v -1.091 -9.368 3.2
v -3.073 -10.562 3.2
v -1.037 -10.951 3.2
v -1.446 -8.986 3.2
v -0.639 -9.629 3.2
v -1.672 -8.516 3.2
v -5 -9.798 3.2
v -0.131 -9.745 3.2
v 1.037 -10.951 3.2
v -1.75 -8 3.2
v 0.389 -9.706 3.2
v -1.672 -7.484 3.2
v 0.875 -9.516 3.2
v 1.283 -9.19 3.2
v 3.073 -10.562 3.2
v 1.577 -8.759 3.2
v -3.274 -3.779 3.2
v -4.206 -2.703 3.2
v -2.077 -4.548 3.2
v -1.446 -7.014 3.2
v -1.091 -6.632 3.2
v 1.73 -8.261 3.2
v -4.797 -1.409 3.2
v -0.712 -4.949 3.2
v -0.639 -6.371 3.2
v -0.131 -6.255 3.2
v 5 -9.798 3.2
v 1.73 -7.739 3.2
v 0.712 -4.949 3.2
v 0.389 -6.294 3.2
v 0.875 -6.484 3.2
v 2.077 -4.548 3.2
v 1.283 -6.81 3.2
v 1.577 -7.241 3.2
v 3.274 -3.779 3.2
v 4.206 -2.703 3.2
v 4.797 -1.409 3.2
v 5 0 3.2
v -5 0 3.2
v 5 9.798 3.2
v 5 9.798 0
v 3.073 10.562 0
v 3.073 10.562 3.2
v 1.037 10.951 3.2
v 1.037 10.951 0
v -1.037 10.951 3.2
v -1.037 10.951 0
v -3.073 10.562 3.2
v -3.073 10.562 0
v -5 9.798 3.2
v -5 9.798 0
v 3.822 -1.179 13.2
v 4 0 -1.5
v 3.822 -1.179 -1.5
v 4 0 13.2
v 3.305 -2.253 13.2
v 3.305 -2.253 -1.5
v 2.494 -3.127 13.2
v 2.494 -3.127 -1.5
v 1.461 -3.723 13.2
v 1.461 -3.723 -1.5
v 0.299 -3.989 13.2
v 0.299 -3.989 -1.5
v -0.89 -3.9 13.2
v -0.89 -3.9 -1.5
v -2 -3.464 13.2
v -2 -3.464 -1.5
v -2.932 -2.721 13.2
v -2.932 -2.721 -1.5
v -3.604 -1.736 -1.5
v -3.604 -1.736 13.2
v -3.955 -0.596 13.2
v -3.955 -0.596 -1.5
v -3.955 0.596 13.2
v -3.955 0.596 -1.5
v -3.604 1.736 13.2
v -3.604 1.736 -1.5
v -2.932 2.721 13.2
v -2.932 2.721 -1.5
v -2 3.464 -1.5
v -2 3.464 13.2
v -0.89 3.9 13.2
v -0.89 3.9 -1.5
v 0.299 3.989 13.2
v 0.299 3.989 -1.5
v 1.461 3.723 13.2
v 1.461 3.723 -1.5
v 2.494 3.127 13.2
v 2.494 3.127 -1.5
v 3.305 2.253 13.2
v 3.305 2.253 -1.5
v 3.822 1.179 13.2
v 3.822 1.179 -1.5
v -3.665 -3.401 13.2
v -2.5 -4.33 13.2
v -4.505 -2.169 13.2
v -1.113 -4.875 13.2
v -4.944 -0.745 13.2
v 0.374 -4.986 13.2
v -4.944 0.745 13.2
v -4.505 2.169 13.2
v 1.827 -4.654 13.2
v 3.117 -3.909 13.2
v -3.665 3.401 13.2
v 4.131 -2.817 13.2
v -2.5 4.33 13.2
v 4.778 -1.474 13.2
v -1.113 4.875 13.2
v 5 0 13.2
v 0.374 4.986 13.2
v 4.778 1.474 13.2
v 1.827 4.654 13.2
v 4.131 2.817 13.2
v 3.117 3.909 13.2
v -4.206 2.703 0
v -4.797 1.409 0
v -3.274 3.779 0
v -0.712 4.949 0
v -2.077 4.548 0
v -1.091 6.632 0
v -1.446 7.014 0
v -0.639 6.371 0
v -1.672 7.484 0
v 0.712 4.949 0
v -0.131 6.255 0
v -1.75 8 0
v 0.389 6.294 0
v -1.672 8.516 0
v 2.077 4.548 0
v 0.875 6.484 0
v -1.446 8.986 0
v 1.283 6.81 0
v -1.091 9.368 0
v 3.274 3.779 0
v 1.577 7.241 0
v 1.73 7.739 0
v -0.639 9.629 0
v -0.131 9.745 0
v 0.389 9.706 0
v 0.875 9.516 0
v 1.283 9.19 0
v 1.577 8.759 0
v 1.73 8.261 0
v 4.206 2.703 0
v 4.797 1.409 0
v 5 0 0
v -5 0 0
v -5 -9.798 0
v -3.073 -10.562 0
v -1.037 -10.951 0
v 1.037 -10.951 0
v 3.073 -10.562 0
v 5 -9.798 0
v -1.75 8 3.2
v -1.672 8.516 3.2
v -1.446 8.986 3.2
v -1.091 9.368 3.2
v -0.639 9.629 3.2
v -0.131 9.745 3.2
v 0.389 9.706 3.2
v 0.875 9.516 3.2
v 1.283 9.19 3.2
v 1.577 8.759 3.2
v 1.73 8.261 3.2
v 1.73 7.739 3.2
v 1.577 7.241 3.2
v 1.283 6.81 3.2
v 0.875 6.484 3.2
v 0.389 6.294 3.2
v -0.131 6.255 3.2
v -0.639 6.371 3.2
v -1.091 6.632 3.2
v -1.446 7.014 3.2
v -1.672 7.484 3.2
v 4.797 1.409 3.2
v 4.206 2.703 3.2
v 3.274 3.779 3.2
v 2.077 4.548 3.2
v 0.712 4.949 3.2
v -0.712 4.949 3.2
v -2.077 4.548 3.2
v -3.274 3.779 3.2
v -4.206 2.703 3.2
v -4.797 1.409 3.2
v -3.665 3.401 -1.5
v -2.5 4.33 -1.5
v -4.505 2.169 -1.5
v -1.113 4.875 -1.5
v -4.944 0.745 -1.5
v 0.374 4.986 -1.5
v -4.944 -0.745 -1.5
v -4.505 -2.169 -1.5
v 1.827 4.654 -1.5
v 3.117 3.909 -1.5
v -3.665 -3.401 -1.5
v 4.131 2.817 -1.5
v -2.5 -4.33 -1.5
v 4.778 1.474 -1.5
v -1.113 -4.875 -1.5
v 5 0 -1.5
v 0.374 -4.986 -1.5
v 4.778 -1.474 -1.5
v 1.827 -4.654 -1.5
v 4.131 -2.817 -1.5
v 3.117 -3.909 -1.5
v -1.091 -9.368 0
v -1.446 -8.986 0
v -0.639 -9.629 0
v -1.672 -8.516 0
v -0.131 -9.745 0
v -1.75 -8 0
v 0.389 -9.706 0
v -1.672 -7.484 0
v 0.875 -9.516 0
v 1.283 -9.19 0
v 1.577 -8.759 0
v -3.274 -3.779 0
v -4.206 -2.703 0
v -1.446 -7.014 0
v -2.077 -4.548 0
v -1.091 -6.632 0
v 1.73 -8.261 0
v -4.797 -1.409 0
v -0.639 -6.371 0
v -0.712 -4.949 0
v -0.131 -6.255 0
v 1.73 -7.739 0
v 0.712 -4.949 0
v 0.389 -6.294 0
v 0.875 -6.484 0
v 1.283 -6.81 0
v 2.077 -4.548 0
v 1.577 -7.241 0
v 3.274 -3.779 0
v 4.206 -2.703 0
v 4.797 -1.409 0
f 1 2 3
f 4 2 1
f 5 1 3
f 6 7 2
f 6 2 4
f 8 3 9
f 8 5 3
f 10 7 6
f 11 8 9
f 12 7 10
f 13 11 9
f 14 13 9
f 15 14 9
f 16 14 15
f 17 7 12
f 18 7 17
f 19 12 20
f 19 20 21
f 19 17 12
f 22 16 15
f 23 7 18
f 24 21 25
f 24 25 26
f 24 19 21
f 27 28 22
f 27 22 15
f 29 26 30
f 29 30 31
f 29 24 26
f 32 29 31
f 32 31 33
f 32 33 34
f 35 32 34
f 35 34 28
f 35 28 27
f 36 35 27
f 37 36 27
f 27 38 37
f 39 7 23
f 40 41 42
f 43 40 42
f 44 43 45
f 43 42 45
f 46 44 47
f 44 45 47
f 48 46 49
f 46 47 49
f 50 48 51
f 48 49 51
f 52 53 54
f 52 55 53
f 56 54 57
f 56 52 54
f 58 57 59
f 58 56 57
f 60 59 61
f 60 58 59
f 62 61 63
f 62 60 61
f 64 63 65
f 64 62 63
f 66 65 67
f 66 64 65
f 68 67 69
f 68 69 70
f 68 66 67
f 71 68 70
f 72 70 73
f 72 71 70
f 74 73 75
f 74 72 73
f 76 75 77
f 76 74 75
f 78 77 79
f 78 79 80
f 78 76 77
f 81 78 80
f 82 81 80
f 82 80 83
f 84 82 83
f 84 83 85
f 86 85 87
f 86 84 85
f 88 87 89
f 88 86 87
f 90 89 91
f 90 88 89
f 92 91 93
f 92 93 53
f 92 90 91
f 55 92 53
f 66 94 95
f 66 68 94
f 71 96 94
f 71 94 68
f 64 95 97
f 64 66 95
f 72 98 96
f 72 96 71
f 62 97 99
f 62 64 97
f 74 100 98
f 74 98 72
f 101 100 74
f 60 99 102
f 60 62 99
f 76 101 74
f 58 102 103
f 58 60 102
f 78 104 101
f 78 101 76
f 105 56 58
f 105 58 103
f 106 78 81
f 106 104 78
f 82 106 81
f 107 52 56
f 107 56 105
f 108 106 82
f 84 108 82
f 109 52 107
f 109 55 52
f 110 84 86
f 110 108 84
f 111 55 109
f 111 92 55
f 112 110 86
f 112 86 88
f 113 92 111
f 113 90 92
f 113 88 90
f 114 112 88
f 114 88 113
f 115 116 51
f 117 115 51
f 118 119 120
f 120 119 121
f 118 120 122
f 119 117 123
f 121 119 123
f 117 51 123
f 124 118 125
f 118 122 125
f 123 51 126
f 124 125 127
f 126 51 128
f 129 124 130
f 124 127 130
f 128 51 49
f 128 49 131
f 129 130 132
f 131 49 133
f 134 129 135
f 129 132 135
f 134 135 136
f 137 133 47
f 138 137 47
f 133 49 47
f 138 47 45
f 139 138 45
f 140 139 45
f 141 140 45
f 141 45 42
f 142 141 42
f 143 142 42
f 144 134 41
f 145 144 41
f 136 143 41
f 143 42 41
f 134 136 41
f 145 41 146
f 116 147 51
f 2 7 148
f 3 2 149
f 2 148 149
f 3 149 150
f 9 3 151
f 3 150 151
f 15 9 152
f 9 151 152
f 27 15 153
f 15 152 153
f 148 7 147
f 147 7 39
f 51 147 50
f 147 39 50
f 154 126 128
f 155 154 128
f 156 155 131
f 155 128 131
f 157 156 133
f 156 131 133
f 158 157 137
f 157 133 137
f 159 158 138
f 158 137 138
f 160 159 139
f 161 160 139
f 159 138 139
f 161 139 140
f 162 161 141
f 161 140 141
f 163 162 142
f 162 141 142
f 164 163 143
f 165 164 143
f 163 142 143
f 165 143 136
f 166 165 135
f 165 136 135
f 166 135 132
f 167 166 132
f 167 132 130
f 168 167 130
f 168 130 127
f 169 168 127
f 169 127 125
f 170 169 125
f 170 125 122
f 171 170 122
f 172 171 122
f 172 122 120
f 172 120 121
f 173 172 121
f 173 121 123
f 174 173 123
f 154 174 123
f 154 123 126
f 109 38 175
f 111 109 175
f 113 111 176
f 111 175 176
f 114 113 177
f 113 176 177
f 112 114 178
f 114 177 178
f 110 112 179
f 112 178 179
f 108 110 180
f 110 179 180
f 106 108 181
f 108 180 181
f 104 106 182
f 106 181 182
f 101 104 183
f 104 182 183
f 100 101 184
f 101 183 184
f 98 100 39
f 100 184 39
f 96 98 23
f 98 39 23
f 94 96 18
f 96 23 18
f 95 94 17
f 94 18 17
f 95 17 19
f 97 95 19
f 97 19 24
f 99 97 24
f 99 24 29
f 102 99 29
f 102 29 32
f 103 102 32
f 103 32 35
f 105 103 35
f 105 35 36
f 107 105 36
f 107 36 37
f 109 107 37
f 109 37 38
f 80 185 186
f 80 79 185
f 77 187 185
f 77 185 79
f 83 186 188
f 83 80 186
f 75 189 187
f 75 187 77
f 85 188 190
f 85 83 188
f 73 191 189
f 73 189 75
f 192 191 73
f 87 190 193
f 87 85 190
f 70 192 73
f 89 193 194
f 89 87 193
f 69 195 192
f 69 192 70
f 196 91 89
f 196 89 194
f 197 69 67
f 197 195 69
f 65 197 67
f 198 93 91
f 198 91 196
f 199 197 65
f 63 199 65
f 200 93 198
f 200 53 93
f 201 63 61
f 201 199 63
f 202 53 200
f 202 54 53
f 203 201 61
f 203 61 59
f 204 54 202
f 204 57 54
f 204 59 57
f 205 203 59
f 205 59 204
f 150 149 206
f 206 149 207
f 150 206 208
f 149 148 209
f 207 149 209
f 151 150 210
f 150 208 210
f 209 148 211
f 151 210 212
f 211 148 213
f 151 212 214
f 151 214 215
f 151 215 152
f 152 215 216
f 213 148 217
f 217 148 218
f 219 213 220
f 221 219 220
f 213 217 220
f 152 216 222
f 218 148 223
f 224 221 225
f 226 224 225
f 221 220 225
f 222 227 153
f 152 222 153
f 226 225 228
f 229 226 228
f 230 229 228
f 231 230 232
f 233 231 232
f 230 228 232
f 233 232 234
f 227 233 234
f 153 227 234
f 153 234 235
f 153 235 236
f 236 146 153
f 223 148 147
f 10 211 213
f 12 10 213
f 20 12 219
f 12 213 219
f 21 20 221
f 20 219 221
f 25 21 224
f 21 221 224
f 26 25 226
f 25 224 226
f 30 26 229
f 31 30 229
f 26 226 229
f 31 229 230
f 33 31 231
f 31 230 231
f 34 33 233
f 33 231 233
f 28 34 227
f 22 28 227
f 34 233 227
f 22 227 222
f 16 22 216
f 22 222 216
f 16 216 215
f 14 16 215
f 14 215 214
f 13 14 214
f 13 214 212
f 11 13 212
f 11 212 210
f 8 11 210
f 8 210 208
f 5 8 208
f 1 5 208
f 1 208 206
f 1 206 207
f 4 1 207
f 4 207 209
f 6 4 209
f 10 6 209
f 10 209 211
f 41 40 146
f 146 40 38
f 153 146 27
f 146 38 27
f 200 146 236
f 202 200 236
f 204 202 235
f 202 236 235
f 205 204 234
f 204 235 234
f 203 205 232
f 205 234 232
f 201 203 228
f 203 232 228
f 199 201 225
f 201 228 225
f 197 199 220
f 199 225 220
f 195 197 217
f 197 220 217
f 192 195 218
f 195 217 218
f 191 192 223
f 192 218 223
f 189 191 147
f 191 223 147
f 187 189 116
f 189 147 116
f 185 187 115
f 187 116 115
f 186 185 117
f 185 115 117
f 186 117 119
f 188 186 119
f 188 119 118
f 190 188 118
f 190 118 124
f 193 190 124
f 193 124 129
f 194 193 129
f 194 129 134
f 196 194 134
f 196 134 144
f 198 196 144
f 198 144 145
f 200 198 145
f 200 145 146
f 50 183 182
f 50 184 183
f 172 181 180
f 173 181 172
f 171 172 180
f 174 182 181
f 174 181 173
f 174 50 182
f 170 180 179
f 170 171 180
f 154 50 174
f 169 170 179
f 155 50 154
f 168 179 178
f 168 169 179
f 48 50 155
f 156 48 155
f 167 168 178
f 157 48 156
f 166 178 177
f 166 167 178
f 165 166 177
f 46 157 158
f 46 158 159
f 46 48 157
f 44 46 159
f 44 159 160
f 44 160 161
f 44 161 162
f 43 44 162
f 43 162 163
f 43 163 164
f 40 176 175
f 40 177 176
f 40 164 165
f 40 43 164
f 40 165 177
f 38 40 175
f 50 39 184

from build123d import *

# Parameters (mm, degrees)
SKETCH_1_R          = 11
EXTRUDE_1_DEPTH     = 3.2
SKETCH_2_R          = 5
EXTRUDE_2_DEPTH     = 10
SKETCH_3_R          = 4
CUT_EXTRUDE_1_DEPTH = 15
SKETCH_4_R          = 1.75
CUT_EXTRUDE_2_DEPTH = 7
CUT_EXTRUDE_4_DEPTH = 19.493242009
SKETCH_7_R          = 5
SKETCH_7_R_2        = 4
EXTRUDE_3_DEPTH     = 1.5


with BuildPart() as part:
    # 草图1 → 凸台-拉伸1 (new body)
    with BuildSketch(Plane.XY):
        Circle(SKETCH_1_R)
    extrude(amount=EXTRUDE_1_DEPTH)

    # 草图2 → 凸台-拉伸2 (add)
    with BuildSketch(Plane.XY.offset(3.2)):
        Circle(SKETCH_2_R)
    extrude(amount=EXTRUDE_2_DEPTH)

    # 草图3 → 切除-拉伸1 (cut)
    with BuildSketch(Plane.XY.offset(13.2)):
        Circle(SKETCH_3_R)
    extrude(amount=-CUT_EXTRUDE_1_DEPTH, mode=Mode.SUBTRACT)

    # 草图4 → 切除-拉伸2 (cut)
    with BuildSketch(Plane(origin=(0, 0, 0), x_dir=(-1, 0, 0), z_dir=(0, 0, -1))):
        with Locations((0, 8)):
            Circle(SKETCH_4_R)
        with Locations((0, -8)):
            Circle(SKETCH_4_R)
    extrude(amount=-CUT_EXTRUDE_2_DEPTH, mode=Mode.SUBTRACT)

    # 草图6 → 切除-拉伸4 (cut, through all)
    with BuildSketch(Plane.XY.offset(3.2)):
        Polygon((-5, 0), (-5, 10.334769888), (-11, 10.334769888), (-11, -9.812151942), (-5, -9.812151942), align=None)
        Polygon((11, -9.812151942), (5, -9.812151942), (5, 0), (5, 10.334769888), (11, 10.334769888), align=None)
    extrude(amount=-CUT_EXTRUDE_4_DEPTH, mode=Mode.SUBTRACT)

    # 草图7 → 凸台-拉伸3 (add)
    with BuildSketch(Plane(origin=(0, 0, 0), x_dir=(-1, 0, 0), z_dir=(0, 0, -1))):
        with Locations(Location((0, 0, 0), (0, 0, 180))):
            Circle(SKETCH_7_R)
        with Locations(Location((0, 0, 0), (0, 0, 180))):
            Circle(SKETCH_7_R_2, mode=Mode.SUBTRACT)
    extrude(amount=EXTRUDE_3_DEPTH)


solid = part.part
